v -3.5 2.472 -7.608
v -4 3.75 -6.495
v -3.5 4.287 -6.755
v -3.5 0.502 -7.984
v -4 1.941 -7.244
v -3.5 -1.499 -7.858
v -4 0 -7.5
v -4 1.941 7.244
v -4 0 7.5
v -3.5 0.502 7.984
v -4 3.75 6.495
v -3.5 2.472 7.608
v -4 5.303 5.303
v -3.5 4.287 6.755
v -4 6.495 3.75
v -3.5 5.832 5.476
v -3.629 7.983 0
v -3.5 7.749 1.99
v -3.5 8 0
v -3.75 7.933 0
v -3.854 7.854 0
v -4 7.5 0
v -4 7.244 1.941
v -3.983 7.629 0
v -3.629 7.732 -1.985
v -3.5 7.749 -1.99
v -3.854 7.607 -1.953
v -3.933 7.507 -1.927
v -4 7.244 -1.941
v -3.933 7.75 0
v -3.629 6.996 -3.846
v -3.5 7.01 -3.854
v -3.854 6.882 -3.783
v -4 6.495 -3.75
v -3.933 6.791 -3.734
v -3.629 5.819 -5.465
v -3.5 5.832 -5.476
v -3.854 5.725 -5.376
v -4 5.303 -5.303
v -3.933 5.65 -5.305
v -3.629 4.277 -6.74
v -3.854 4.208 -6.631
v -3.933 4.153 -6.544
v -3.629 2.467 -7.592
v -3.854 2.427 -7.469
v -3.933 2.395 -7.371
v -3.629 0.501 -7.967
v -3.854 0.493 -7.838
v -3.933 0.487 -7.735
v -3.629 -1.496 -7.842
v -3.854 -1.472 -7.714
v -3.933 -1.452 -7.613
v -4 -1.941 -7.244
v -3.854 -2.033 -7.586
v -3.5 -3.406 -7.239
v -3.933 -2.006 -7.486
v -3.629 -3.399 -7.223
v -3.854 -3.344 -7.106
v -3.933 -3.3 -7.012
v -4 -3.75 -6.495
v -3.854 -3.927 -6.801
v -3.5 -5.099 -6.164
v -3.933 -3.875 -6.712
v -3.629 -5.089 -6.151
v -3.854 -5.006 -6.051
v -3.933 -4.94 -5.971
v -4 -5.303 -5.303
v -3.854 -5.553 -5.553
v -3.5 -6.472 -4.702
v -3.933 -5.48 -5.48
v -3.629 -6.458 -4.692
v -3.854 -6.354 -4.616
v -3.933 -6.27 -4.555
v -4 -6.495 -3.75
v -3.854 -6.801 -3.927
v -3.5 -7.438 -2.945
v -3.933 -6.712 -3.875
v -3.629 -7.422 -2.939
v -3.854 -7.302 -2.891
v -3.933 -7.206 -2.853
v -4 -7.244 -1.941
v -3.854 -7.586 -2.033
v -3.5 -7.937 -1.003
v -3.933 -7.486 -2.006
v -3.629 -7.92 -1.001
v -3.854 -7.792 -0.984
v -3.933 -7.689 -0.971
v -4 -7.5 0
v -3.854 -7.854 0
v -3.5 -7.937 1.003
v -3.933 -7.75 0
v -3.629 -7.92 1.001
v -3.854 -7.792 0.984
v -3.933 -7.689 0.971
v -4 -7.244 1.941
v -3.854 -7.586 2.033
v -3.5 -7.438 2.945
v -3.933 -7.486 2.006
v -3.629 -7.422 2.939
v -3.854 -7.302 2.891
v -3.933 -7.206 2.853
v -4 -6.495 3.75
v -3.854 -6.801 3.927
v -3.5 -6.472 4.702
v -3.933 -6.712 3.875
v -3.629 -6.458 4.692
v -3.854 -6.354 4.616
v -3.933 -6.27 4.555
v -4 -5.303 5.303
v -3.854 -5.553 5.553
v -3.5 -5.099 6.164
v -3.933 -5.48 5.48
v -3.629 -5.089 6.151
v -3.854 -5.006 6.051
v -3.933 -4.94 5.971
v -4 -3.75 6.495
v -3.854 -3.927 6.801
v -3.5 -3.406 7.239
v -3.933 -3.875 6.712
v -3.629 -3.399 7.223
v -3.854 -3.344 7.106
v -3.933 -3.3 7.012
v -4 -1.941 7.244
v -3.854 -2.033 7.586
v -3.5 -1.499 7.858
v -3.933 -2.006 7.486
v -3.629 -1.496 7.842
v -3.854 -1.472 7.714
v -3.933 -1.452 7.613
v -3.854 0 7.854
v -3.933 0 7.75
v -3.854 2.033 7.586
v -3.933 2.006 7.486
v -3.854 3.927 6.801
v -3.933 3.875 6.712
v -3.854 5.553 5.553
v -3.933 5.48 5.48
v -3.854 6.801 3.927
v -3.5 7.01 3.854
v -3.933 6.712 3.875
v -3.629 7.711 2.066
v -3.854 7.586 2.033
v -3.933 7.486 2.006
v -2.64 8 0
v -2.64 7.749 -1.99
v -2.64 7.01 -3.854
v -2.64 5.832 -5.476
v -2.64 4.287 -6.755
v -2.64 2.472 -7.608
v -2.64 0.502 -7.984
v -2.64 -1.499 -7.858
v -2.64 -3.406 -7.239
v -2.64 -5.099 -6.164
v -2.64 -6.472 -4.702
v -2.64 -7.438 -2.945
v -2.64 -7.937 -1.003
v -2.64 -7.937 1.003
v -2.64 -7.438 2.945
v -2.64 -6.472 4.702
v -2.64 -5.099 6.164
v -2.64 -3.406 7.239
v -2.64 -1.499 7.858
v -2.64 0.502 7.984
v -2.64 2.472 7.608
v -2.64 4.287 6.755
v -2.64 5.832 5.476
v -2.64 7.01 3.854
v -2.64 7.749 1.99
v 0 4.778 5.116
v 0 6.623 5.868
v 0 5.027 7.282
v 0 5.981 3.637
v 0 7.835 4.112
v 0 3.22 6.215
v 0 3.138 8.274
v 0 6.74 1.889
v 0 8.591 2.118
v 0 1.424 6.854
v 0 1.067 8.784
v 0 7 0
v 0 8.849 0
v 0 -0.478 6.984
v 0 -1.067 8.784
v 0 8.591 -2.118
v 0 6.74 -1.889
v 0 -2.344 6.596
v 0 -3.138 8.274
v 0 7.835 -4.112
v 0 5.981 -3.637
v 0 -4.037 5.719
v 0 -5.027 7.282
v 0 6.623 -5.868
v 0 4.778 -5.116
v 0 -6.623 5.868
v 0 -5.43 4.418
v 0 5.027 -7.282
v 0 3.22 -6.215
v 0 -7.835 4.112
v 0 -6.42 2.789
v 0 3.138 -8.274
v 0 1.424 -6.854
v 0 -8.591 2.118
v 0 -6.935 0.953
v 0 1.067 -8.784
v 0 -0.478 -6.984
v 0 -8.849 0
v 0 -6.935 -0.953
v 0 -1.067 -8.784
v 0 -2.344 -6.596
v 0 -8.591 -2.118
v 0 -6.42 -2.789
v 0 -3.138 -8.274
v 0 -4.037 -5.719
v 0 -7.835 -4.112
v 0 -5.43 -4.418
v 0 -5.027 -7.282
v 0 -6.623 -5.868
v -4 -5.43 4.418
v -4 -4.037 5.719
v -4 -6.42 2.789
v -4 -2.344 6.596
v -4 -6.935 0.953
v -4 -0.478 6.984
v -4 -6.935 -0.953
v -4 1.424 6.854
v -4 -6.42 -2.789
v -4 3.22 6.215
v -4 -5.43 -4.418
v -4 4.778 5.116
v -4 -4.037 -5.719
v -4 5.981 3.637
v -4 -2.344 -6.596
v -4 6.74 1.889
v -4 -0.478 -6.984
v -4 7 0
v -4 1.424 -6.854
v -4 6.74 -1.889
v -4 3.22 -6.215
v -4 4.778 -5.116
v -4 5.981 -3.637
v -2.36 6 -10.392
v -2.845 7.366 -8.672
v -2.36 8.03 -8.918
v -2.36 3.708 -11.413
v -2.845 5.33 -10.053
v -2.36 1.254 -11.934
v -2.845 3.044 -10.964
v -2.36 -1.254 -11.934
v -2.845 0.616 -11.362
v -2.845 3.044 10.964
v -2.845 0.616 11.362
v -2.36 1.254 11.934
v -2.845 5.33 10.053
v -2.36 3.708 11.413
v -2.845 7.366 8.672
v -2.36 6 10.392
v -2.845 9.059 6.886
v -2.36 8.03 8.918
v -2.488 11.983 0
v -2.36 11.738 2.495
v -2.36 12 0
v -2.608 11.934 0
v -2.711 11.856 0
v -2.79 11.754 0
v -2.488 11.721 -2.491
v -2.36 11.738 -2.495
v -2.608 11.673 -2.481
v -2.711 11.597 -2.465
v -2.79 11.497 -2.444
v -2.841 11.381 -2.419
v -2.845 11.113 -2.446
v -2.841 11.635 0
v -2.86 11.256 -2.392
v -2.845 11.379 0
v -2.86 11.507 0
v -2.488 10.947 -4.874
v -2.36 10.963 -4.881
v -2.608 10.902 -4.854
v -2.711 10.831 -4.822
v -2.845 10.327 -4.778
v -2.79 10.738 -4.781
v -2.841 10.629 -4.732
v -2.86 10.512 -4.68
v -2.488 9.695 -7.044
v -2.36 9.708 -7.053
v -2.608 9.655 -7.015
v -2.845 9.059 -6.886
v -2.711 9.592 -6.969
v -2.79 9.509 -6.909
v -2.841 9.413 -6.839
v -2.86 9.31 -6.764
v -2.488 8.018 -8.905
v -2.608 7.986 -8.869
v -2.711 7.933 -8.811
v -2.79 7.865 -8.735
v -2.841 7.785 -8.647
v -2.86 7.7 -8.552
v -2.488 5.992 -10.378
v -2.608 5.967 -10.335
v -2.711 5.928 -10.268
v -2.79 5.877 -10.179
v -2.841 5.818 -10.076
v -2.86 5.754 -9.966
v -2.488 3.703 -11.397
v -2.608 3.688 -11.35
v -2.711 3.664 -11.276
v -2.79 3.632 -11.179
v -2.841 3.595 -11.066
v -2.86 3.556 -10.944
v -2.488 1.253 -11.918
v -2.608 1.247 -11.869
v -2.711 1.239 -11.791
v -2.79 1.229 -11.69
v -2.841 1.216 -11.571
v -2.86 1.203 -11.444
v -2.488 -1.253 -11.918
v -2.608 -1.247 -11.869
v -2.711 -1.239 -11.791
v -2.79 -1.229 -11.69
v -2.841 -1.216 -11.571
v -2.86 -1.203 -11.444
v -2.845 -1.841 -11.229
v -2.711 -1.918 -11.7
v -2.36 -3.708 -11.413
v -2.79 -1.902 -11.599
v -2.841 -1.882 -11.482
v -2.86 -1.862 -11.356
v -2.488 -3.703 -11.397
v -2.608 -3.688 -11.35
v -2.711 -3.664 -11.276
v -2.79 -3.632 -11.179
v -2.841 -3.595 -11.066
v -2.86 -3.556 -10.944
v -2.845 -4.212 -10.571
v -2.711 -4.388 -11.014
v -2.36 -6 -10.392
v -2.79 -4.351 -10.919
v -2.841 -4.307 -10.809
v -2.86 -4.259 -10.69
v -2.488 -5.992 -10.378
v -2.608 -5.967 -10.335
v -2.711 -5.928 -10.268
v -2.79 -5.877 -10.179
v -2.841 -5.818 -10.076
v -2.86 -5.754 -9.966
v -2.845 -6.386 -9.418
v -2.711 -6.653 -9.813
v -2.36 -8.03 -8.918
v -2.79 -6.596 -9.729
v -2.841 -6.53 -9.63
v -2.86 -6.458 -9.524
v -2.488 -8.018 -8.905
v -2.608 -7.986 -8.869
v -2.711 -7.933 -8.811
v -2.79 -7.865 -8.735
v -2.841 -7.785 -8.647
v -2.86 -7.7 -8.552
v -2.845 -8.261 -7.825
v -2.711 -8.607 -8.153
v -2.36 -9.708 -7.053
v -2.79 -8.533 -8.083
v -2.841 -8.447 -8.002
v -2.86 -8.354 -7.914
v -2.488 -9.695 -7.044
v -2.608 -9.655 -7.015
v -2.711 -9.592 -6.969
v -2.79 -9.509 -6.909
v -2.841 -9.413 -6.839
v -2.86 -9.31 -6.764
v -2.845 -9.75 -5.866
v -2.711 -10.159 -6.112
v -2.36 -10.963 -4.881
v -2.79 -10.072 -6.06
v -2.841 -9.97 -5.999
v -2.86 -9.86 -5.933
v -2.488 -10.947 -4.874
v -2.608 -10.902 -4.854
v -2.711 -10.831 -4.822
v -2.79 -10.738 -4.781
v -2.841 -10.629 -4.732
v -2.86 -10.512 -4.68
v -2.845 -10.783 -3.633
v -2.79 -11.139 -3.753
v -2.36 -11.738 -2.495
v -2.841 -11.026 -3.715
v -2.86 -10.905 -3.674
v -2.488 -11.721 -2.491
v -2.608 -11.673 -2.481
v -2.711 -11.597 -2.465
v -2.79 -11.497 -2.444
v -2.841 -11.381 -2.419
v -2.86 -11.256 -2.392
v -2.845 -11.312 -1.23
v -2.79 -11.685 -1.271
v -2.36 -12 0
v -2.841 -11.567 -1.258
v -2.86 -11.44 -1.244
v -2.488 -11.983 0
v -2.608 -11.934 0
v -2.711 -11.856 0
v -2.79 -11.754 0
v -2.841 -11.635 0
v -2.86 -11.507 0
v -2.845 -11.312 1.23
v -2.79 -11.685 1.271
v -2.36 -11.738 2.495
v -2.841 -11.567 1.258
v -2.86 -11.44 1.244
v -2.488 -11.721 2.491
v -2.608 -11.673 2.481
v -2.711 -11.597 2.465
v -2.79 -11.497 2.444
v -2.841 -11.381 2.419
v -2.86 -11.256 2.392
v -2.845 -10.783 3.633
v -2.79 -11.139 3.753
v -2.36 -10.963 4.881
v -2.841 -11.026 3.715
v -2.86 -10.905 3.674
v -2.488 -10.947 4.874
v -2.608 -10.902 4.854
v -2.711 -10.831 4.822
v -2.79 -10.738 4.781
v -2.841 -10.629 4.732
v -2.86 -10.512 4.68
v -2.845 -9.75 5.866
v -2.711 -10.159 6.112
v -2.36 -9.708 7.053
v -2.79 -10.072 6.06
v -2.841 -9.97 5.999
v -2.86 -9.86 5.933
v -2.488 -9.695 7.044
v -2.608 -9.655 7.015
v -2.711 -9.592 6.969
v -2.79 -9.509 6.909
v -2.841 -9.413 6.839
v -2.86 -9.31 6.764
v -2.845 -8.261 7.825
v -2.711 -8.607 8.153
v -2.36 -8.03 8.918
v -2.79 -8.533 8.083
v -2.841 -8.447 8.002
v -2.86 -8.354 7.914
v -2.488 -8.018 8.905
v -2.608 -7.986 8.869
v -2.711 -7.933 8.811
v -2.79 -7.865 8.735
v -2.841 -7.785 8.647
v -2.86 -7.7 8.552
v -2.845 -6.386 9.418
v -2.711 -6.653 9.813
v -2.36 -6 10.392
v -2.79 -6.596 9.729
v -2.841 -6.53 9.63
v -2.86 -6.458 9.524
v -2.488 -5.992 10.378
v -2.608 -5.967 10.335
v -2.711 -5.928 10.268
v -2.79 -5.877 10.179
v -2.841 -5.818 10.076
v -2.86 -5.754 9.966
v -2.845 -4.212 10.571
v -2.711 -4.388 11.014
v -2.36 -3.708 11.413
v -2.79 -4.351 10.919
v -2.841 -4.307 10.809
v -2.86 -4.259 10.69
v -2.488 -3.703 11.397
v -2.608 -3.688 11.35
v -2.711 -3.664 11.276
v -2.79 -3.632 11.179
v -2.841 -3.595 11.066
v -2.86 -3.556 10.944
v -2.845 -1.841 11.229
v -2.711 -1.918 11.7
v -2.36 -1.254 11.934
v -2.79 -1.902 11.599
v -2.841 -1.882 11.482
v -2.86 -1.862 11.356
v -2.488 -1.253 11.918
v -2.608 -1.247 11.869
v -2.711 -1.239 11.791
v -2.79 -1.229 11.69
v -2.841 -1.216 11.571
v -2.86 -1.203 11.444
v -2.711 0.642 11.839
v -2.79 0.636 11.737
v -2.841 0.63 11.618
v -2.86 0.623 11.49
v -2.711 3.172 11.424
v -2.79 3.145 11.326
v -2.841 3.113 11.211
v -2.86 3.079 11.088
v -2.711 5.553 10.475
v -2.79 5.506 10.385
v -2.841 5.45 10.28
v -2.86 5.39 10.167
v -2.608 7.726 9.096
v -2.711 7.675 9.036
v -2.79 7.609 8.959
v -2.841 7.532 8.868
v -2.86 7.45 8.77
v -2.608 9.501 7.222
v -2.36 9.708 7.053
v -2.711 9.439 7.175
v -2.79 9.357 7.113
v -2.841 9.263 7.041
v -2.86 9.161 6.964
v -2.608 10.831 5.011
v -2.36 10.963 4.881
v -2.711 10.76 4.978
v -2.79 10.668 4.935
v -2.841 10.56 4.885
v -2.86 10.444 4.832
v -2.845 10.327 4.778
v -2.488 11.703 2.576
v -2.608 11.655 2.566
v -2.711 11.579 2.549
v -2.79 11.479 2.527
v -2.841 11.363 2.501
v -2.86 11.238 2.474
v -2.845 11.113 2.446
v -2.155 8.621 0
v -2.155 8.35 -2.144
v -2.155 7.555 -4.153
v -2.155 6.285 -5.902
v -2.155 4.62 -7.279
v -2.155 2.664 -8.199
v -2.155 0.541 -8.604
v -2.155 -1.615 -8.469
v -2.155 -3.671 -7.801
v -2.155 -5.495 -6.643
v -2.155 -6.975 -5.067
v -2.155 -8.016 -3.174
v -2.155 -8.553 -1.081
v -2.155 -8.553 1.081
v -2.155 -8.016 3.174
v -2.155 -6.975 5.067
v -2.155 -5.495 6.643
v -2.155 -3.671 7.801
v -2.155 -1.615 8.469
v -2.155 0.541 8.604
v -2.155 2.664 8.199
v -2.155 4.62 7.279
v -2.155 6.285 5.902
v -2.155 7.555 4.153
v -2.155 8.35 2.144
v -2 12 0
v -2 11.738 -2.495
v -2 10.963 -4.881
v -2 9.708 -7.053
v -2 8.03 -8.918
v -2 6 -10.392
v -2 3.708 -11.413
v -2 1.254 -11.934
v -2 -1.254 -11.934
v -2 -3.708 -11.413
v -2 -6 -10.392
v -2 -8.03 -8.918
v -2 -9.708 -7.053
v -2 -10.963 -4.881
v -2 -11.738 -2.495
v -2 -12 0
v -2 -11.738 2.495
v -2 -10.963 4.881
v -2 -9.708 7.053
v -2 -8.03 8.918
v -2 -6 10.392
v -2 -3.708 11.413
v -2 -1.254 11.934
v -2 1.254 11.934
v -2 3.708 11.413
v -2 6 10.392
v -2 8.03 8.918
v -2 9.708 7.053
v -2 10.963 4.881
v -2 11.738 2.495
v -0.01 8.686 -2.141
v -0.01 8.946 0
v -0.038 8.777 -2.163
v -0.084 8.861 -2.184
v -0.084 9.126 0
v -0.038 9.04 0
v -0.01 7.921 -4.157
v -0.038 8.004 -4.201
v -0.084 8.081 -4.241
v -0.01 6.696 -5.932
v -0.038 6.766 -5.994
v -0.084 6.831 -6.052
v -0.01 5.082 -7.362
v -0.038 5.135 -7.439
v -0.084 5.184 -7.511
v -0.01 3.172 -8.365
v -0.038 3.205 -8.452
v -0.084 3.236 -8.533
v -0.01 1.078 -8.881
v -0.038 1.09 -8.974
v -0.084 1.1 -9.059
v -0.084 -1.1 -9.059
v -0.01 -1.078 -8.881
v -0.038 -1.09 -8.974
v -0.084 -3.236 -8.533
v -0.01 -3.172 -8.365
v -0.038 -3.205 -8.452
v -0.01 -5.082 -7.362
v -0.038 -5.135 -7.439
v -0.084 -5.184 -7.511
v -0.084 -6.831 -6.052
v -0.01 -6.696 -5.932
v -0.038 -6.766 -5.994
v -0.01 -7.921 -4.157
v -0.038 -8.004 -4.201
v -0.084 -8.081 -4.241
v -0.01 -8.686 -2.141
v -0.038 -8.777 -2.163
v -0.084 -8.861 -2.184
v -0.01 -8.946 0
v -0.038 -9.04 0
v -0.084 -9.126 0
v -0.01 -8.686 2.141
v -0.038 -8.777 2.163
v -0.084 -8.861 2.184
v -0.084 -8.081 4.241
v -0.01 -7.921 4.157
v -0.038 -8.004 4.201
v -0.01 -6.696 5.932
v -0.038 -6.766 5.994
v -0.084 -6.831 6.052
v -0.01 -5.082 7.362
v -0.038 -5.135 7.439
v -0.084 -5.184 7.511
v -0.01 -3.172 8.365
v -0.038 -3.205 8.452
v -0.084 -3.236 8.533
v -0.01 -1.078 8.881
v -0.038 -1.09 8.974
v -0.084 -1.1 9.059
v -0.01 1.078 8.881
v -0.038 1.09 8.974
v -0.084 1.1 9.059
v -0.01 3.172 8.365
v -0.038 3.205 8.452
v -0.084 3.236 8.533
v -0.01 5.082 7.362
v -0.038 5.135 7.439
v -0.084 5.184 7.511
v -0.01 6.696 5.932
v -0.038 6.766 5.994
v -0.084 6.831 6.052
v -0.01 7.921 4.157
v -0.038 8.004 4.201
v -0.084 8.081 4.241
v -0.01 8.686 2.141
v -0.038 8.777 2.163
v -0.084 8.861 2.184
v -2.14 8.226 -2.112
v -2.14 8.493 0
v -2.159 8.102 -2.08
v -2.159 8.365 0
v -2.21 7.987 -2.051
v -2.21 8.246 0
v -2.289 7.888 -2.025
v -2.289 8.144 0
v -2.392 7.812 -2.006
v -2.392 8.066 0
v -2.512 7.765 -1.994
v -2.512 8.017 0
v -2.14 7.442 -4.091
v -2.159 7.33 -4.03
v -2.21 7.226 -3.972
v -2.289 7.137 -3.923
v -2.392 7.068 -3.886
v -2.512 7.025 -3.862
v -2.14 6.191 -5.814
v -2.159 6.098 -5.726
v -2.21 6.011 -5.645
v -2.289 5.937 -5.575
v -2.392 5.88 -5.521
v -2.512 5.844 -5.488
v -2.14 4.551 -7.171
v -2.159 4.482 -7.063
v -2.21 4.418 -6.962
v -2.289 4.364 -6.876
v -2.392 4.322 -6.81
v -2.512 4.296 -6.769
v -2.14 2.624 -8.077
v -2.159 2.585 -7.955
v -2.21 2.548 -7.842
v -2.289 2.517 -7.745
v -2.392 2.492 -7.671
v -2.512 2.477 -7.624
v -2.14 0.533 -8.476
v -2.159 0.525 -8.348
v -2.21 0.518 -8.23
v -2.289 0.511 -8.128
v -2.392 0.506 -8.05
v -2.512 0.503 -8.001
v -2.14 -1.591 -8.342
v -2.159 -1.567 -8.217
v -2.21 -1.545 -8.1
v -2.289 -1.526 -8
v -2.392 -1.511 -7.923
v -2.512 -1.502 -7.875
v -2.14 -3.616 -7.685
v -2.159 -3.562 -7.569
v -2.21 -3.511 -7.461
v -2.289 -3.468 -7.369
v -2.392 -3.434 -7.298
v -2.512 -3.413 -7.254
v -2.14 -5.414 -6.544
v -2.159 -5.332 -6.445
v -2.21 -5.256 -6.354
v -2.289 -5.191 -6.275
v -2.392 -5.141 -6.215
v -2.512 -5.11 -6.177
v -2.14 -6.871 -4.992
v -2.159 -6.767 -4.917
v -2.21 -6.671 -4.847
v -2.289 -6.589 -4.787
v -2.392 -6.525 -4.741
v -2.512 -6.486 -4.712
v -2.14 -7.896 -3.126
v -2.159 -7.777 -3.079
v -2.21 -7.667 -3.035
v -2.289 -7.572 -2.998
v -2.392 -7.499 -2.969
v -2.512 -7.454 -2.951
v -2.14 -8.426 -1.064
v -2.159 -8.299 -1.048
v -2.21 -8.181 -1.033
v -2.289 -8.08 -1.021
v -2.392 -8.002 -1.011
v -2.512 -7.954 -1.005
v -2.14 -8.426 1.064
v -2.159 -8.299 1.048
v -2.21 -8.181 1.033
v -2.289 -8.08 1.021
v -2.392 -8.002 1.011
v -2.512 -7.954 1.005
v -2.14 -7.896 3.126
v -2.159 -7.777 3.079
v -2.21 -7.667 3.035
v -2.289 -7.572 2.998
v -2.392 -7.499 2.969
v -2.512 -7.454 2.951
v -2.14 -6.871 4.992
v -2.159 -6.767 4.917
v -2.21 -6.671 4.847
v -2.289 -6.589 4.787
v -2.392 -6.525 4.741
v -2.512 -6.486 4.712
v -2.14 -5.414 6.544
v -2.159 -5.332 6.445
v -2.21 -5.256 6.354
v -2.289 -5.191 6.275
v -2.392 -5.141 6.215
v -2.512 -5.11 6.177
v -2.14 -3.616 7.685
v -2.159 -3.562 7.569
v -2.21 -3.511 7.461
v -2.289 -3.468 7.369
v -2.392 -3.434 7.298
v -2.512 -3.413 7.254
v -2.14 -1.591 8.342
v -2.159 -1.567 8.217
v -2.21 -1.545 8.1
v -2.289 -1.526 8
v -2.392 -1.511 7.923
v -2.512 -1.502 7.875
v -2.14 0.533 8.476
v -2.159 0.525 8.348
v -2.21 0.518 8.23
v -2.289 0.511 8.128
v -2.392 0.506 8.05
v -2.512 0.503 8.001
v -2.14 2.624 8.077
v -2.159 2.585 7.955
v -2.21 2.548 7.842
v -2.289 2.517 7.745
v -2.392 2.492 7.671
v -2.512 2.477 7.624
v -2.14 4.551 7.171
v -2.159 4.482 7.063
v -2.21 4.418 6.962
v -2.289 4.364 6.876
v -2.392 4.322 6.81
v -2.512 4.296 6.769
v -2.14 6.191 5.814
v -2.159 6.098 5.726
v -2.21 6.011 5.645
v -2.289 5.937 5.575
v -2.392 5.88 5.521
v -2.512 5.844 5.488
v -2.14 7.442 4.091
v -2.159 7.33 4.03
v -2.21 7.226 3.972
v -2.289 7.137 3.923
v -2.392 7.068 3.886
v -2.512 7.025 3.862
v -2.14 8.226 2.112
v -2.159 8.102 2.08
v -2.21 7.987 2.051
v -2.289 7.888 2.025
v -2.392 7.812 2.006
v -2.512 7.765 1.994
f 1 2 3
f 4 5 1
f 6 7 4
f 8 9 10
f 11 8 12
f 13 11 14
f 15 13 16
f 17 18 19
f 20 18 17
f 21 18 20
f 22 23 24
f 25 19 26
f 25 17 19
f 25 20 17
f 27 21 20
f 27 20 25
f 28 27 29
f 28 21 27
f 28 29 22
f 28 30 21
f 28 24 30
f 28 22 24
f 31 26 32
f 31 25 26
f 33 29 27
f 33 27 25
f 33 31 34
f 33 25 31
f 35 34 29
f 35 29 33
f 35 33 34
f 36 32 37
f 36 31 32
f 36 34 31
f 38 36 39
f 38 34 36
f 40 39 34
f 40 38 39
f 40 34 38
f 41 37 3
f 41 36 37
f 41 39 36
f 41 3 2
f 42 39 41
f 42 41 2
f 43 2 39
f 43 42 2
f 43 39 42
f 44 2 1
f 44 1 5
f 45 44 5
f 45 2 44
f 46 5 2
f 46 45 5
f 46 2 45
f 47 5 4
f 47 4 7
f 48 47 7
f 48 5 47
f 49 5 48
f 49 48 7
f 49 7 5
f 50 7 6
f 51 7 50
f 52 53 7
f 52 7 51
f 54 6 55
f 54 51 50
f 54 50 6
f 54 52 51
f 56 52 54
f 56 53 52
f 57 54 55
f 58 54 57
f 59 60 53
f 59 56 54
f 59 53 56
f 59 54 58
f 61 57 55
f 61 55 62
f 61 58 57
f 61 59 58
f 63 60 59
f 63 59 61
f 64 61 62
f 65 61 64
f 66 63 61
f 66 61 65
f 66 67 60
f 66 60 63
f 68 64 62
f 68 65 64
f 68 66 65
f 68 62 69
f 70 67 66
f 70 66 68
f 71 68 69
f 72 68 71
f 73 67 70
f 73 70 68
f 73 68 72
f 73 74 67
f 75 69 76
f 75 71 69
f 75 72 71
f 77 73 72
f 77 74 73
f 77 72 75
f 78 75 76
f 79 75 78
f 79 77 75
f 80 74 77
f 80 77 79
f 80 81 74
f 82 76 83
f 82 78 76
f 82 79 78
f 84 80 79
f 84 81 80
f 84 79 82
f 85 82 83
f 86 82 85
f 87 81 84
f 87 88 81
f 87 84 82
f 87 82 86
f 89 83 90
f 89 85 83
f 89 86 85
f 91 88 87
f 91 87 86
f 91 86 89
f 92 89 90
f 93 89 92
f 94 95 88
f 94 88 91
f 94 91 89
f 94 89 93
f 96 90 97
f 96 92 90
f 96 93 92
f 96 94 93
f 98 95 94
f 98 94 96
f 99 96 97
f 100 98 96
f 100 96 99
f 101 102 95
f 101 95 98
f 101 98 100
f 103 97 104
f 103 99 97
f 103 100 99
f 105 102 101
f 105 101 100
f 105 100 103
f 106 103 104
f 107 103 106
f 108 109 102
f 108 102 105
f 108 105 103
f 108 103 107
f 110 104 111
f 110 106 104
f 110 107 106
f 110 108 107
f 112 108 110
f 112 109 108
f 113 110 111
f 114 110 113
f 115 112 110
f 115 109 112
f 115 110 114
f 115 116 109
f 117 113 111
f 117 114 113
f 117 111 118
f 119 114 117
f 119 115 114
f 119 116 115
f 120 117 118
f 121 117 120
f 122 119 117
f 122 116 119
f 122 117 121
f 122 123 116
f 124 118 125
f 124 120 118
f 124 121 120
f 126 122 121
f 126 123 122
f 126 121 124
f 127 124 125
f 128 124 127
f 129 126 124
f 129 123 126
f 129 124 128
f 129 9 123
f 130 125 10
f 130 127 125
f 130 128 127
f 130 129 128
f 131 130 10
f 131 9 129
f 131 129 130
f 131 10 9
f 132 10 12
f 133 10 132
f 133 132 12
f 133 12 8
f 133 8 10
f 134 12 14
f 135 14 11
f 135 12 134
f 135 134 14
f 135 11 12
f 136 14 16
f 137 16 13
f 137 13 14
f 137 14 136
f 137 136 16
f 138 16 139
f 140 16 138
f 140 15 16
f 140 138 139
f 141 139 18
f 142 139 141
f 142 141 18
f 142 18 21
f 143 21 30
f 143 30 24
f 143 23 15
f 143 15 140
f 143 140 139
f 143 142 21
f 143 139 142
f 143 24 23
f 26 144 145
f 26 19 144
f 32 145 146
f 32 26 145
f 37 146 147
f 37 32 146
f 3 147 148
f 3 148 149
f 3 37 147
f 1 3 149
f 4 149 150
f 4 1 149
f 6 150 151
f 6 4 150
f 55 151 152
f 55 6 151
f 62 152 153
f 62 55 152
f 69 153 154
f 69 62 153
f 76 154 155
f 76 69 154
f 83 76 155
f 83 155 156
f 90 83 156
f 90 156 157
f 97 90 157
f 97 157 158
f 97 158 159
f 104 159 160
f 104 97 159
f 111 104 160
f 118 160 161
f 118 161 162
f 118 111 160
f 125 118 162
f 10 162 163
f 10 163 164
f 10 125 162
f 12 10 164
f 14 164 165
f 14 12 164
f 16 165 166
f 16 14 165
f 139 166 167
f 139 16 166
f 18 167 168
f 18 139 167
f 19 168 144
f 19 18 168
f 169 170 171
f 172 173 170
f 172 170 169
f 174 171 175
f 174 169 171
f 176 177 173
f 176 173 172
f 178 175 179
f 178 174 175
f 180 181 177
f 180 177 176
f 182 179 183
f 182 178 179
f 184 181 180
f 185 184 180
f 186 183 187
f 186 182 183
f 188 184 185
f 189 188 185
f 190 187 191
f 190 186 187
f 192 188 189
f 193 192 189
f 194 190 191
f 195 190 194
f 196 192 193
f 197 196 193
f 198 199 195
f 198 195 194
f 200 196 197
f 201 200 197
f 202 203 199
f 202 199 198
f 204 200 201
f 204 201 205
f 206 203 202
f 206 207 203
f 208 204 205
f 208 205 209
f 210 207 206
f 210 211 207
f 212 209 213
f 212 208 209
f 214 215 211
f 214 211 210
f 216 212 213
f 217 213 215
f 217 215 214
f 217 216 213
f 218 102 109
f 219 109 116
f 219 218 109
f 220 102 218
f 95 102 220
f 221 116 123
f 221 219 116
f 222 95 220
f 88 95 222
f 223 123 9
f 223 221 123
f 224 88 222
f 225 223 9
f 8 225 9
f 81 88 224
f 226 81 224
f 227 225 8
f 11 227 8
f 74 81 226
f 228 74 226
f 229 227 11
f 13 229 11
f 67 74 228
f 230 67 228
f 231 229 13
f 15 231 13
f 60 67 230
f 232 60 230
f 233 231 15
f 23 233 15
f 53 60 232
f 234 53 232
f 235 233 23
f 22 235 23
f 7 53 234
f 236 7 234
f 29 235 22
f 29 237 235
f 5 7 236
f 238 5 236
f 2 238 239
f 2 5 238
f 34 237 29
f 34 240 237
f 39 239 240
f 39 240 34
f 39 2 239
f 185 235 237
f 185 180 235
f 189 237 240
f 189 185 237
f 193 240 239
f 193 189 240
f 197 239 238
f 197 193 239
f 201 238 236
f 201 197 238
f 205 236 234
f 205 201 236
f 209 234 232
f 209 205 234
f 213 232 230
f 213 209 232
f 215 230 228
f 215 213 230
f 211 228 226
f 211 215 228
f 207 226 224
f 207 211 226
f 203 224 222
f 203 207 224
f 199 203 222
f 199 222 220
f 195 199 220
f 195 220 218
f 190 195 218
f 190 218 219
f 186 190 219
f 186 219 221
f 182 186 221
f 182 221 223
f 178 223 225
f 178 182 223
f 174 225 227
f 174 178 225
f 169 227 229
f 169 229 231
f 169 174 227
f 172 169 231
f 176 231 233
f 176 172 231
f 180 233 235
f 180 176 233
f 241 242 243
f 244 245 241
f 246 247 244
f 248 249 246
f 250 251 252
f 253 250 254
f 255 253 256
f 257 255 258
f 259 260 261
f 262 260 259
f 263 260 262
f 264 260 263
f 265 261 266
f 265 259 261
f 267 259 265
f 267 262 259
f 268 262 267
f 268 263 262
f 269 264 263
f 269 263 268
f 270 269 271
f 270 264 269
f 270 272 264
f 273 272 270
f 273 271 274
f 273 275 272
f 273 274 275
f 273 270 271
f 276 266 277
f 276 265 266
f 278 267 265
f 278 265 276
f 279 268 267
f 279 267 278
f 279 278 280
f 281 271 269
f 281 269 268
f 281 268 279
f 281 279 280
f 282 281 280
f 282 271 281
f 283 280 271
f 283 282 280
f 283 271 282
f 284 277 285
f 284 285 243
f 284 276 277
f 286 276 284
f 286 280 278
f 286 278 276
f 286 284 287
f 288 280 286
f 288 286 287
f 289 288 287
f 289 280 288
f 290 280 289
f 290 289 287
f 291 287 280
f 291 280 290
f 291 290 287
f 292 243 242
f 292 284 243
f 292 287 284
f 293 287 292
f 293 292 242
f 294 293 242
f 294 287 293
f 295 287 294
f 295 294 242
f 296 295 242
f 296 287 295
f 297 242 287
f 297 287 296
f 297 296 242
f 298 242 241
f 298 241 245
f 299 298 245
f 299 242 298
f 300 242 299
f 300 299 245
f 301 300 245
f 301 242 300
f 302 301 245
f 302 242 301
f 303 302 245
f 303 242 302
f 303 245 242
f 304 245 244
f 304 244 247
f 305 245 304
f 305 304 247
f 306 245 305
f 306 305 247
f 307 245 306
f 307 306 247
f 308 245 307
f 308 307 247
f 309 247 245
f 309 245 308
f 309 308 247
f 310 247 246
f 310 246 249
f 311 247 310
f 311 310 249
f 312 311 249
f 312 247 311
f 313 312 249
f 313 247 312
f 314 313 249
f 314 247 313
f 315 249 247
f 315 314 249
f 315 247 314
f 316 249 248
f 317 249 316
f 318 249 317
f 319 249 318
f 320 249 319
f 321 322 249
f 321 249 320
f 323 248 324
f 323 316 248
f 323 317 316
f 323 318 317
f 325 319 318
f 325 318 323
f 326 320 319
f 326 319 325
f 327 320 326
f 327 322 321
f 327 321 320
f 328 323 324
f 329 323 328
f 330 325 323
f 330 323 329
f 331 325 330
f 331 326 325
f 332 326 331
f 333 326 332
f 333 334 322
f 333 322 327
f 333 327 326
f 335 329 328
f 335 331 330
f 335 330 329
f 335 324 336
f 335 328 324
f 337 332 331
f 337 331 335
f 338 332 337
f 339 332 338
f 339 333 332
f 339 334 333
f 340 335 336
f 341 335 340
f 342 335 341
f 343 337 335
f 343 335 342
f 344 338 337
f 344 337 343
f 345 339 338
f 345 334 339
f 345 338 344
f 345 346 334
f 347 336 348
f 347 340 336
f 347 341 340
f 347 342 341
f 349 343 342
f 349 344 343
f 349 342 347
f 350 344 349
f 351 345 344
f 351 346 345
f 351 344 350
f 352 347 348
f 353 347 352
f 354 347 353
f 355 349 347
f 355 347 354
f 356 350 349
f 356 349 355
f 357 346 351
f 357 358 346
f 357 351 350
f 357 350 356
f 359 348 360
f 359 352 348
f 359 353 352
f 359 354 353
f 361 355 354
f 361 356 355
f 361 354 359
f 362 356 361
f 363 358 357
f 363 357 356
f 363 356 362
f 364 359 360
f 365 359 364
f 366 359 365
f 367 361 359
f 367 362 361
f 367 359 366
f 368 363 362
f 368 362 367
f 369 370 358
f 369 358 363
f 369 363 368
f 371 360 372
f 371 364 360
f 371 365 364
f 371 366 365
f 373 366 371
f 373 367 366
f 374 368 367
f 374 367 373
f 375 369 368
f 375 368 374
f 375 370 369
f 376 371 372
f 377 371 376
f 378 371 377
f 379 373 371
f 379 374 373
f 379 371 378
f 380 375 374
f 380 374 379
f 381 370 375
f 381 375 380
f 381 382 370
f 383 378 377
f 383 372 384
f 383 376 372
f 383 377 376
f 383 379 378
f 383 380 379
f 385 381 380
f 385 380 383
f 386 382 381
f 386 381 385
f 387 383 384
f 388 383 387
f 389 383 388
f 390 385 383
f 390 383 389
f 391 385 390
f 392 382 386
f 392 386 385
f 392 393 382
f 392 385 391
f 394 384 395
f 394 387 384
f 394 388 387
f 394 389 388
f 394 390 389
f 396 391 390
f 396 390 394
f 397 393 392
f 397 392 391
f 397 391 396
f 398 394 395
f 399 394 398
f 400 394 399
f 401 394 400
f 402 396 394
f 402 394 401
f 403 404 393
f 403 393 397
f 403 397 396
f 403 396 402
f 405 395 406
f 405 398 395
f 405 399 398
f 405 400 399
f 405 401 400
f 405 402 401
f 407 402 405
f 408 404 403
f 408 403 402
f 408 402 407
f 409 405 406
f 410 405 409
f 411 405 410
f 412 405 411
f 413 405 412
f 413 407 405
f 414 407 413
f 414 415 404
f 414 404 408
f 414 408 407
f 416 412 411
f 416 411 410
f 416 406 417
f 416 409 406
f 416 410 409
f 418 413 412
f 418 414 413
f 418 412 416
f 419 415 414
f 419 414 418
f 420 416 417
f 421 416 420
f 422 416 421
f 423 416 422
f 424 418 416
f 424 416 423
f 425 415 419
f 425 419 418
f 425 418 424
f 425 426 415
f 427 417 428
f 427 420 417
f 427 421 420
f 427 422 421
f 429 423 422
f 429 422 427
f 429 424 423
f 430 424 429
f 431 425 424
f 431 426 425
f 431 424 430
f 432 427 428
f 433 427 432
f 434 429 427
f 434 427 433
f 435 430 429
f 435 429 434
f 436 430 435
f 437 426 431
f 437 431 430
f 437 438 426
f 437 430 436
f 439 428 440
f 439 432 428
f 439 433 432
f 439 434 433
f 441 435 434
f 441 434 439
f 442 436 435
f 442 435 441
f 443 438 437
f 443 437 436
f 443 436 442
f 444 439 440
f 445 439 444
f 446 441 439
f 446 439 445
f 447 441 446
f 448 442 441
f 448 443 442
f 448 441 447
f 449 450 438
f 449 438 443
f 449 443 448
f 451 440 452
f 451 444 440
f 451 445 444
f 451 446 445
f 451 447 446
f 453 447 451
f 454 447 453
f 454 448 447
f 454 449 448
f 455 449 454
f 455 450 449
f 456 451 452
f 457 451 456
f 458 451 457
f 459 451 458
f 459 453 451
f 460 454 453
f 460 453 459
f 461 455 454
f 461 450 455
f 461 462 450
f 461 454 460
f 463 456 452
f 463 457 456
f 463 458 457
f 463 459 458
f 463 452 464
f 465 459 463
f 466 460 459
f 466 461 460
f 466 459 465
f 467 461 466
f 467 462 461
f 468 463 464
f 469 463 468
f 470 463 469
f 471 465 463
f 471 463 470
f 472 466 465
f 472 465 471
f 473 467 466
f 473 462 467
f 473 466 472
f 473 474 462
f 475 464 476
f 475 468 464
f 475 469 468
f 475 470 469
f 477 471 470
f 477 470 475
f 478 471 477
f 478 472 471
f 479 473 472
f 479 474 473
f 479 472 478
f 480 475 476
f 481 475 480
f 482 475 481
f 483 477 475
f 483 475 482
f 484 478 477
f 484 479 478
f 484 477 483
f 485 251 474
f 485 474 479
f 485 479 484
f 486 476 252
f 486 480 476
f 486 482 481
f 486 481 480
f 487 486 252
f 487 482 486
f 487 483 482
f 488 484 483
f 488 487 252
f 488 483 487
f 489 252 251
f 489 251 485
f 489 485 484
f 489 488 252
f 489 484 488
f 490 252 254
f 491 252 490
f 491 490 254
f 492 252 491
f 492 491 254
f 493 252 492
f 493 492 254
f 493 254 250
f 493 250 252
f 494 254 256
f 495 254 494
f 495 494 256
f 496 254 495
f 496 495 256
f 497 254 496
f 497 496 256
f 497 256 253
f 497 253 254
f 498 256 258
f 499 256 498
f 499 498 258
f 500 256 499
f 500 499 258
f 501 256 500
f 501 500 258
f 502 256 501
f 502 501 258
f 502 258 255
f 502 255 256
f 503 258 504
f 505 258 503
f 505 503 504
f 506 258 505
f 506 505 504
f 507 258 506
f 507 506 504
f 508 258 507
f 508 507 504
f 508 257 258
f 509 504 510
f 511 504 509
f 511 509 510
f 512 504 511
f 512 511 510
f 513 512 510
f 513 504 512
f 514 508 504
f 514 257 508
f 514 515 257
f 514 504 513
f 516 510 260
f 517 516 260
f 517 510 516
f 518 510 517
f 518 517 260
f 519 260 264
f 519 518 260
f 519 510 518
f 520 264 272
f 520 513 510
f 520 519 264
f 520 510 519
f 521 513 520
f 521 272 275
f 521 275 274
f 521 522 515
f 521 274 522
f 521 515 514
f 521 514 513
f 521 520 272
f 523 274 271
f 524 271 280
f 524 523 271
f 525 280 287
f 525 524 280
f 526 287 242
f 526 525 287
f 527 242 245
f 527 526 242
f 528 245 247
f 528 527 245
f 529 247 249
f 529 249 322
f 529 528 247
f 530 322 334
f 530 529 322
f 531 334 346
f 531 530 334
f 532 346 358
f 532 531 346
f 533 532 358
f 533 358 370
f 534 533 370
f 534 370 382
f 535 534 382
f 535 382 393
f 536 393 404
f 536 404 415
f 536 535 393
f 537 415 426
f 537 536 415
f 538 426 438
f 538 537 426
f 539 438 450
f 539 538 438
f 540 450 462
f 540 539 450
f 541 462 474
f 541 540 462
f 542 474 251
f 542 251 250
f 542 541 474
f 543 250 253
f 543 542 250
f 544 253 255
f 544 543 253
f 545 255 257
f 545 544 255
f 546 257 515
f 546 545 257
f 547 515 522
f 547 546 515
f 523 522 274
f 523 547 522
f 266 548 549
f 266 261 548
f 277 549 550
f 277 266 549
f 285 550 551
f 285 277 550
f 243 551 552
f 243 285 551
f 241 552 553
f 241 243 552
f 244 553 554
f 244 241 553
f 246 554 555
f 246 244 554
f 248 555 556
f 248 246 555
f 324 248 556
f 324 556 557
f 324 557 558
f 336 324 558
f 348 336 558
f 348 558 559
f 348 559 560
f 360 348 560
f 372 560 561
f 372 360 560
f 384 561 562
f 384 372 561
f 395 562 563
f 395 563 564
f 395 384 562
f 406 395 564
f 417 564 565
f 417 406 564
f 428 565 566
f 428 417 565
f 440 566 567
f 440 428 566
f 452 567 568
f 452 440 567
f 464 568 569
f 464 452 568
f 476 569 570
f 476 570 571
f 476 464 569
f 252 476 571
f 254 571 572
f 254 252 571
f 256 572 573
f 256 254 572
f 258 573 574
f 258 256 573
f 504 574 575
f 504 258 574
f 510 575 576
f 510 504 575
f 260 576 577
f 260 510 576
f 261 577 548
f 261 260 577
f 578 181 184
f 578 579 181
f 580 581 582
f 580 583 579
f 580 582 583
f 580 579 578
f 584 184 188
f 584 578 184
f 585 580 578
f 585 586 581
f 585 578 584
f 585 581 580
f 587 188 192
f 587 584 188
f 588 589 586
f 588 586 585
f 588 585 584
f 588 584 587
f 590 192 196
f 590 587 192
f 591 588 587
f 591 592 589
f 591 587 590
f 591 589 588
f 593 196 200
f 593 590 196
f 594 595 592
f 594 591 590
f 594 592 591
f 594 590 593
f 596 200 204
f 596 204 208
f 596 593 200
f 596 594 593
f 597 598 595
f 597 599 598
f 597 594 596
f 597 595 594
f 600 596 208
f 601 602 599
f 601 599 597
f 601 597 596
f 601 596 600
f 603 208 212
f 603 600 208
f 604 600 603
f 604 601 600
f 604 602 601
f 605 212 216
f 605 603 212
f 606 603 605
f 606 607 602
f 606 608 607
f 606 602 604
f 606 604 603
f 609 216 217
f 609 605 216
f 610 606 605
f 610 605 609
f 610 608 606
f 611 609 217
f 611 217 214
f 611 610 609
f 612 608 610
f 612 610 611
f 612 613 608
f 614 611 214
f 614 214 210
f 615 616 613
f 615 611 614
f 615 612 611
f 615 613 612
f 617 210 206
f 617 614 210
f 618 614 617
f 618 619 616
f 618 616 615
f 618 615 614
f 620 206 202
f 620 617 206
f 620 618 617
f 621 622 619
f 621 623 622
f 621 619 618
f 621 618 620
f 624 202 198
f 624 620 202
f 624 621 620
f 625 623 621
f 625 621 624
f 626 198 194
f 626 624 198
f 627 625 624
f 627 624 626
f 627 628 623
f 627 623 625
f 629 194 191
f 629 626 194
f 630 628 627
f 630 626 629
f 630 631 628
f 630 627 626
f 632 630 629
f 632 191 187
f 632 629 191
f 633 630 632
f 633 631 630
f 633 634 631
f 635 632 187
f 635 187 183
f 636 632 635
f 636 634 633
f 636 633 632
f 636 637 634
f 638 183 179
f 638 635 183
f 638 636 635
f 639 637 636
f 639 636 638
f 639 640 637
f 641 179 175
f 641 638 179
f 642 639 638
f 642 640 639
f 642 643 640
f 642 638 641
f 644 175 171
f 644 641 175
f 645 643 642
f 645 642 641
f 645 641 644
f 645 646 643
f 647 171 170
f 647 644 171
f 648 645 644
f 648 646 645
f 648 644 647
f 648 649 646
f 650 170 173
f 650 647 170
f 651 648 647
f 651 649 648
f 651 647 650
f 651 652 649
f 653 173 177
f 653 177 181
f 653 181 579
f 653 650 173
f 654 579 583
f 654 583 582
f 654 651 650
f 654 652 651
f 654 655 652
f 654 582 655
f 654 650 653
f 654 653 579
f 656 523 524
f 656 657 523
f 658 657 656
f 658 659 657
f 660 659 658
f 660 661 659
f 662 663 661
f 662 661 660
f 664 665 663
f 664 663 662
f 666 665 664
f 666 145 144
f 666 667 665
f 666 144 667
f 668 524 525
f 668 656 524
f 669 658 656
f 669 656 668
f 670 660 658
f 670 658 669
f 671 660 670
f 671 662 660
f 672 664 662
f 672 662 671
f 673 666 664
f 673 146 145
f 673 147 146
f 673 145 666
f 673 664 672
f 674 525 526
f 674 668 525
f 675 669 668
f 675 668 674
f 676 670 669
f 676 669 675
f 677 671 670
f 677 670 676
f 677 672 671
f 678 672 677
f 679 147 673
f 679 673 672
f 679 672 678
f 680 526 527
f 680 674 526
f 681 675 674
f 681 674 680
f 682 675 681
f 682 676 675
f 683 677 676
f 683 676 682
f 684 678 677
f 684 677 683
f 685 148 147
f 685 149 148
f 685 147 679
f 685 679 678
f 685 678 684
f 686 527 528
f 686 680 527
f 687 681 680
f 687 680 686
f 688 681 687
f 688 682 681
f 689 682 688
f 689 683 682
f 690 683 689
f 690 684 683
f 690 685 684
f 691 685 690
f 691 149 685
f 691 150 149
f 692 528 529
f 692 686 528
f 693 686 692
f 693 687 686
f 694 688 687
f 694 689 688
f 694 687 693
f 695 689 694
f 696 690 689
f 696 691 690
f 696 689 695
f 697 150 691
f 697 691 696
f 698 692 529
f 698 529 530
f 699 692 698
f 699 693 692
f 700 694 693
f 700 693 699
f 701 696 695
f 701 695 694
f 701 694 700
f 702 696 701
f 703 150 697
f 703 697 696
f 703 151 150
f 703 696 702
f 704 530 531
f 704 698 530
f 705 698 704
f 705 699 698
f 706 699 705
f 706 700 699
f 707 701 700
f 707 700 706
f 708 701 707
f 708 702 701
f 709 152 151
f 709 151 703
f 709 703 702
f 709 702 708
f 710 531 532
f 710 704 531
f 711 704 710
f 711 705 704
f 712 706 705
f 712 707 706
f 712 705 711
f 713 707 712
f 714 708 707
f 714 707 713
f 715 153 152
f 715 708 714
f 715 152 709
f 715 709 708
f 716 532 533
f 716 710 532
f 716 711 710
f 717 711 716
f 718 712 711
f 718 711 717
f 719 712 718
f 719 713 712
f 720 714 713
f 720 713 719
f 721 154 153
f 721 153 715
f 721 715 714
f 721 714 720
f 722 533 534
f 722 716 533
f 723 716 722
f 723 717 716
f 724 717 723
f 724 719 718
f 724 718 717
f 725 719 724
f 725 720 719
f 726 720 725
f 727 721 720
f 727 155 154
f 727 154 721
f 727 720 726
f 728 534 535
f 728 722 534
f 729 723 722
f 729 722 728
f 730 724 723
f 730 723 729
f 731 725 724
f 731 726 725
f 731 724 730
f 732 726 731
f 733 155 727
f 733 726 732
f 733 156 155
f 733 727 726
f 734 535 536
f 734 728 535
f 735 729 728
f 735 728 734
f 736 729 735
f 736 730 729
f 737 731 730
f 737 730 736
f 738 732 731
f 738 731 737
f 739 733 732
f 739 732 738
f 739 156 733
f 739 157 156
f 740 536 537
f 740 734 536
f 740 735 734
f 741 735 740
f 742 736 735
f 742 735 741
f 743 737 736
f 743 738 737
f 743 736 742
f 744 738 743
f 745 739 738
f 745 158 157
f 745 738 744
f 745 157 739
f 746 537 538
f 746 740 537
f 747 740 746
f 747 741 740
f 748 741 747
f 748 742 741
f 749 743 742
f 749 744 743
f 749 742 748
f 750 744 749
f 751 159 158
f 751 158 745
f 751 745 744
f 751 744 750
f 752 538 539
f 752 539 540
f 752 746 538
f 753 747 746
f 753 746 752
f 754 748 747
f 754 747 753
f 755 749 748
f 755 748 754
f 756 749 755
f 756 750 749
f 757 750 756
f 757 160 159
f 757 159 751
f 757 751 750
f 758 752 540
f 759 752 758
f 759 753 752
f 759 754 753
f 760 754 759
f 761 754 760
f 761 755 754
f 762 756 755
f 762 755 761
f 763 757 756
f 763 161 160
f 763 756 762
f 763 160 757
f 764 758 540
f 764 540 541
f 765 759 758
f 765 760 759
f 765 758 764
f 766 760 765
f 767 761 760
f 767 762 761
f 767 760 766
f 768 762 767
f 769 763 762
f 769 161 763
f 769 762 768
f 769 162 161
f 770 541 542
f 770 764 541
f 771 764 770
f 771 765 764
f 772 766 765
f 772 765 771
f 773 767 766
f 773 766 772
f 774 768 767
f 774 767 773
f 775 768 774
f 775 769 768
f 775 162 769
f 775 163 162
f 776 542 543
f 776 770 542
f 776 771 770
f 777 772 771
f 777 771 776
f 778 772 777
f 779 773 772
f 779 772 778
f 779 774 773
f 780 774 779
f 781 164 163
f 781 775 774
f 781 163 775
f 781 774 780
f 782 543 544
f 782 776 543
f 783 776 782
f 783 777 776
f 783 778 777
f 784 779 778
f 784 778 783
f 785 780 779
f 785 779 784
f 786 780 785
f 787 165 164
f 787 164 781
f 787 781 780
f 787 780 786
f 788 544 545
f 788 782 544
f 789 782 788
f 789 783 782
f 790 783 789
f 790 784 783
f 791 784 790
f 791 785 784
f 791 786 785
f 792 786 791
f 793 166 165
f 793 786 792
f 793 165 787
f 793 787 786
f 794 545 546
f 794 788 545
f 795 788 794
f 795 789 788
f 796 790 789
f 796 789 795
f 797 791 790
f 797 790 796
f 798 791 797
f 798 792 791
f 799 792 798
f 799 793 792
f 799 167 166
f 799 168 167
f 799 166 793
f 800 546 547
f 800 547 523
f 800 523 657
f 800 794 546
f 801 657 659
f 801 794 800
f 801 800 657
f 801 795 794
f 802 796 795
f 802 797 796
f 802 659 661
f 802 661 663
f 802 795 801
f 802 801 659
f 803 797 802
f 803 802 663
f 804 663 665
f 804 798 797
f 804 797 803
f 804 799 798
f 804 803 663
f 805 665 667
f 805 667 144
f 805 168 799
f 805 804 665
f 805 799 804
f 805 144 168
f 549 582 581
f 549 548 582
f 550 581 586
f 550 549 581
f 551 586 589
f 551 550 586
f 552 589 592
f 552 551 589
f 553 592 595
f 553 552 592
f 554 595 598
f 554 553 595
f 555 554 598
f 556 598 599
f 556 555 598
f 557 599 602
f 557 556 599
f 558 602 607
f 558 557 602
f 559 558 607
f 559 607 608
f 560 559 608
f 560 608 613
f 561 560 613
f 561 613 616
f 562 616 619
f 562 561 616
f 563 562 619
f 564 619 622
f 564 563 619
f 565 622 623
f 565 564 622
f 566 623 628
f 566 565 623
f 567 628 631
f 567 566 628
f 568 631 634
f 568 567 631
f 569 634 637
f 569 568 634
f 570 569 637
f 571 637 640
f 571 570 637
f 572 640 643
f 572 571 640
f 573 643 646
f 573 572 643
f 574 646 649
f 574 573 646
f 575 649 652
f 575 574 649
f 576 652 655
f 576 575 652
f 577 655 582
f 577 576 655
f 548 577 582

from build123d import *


with BuildPart() as part:
    # Sketch1 → Revolve1 (revolve)
    with BuildSketch(Plane.XY):
        with BuildLine():
            Line((0, 7), (0, 8.848612181))
            ThreePointArc((0, 8.848612181), (-0.021453987, 8.993504255), (-0.083974853, 9.125962279))
            Line((-0.083974853, 9.125962279), (-2, 12))
            Line((-2, 12), (-2.359611797, 12))
            ThreePointArc((-2.359611797, 12), (-2.753714516, 11.807706105), (-2.844683047, 11.378732187))
            Line((-2.844683047, 11.378732187), (-2.155316953, 8.621267813))
            ThreePointArc((-2.155316953, 8.621267813), (-2.246285484, 8.192293895), (-2.640388203, 8))
            Line((-2.640388203, 8), (-3.5, 8))
            ThreePointArc((-3.5, 8), (-3.853553391, 7.853553391), (-4, 7.5))
            Line((-4, 7.5), (-4, 7))
            Line((-4, 7), (0, 7))
        make_face()
    revolve(axis=Axis((0, 0, 0), (-1, 0, 0)))


solid = part.part
